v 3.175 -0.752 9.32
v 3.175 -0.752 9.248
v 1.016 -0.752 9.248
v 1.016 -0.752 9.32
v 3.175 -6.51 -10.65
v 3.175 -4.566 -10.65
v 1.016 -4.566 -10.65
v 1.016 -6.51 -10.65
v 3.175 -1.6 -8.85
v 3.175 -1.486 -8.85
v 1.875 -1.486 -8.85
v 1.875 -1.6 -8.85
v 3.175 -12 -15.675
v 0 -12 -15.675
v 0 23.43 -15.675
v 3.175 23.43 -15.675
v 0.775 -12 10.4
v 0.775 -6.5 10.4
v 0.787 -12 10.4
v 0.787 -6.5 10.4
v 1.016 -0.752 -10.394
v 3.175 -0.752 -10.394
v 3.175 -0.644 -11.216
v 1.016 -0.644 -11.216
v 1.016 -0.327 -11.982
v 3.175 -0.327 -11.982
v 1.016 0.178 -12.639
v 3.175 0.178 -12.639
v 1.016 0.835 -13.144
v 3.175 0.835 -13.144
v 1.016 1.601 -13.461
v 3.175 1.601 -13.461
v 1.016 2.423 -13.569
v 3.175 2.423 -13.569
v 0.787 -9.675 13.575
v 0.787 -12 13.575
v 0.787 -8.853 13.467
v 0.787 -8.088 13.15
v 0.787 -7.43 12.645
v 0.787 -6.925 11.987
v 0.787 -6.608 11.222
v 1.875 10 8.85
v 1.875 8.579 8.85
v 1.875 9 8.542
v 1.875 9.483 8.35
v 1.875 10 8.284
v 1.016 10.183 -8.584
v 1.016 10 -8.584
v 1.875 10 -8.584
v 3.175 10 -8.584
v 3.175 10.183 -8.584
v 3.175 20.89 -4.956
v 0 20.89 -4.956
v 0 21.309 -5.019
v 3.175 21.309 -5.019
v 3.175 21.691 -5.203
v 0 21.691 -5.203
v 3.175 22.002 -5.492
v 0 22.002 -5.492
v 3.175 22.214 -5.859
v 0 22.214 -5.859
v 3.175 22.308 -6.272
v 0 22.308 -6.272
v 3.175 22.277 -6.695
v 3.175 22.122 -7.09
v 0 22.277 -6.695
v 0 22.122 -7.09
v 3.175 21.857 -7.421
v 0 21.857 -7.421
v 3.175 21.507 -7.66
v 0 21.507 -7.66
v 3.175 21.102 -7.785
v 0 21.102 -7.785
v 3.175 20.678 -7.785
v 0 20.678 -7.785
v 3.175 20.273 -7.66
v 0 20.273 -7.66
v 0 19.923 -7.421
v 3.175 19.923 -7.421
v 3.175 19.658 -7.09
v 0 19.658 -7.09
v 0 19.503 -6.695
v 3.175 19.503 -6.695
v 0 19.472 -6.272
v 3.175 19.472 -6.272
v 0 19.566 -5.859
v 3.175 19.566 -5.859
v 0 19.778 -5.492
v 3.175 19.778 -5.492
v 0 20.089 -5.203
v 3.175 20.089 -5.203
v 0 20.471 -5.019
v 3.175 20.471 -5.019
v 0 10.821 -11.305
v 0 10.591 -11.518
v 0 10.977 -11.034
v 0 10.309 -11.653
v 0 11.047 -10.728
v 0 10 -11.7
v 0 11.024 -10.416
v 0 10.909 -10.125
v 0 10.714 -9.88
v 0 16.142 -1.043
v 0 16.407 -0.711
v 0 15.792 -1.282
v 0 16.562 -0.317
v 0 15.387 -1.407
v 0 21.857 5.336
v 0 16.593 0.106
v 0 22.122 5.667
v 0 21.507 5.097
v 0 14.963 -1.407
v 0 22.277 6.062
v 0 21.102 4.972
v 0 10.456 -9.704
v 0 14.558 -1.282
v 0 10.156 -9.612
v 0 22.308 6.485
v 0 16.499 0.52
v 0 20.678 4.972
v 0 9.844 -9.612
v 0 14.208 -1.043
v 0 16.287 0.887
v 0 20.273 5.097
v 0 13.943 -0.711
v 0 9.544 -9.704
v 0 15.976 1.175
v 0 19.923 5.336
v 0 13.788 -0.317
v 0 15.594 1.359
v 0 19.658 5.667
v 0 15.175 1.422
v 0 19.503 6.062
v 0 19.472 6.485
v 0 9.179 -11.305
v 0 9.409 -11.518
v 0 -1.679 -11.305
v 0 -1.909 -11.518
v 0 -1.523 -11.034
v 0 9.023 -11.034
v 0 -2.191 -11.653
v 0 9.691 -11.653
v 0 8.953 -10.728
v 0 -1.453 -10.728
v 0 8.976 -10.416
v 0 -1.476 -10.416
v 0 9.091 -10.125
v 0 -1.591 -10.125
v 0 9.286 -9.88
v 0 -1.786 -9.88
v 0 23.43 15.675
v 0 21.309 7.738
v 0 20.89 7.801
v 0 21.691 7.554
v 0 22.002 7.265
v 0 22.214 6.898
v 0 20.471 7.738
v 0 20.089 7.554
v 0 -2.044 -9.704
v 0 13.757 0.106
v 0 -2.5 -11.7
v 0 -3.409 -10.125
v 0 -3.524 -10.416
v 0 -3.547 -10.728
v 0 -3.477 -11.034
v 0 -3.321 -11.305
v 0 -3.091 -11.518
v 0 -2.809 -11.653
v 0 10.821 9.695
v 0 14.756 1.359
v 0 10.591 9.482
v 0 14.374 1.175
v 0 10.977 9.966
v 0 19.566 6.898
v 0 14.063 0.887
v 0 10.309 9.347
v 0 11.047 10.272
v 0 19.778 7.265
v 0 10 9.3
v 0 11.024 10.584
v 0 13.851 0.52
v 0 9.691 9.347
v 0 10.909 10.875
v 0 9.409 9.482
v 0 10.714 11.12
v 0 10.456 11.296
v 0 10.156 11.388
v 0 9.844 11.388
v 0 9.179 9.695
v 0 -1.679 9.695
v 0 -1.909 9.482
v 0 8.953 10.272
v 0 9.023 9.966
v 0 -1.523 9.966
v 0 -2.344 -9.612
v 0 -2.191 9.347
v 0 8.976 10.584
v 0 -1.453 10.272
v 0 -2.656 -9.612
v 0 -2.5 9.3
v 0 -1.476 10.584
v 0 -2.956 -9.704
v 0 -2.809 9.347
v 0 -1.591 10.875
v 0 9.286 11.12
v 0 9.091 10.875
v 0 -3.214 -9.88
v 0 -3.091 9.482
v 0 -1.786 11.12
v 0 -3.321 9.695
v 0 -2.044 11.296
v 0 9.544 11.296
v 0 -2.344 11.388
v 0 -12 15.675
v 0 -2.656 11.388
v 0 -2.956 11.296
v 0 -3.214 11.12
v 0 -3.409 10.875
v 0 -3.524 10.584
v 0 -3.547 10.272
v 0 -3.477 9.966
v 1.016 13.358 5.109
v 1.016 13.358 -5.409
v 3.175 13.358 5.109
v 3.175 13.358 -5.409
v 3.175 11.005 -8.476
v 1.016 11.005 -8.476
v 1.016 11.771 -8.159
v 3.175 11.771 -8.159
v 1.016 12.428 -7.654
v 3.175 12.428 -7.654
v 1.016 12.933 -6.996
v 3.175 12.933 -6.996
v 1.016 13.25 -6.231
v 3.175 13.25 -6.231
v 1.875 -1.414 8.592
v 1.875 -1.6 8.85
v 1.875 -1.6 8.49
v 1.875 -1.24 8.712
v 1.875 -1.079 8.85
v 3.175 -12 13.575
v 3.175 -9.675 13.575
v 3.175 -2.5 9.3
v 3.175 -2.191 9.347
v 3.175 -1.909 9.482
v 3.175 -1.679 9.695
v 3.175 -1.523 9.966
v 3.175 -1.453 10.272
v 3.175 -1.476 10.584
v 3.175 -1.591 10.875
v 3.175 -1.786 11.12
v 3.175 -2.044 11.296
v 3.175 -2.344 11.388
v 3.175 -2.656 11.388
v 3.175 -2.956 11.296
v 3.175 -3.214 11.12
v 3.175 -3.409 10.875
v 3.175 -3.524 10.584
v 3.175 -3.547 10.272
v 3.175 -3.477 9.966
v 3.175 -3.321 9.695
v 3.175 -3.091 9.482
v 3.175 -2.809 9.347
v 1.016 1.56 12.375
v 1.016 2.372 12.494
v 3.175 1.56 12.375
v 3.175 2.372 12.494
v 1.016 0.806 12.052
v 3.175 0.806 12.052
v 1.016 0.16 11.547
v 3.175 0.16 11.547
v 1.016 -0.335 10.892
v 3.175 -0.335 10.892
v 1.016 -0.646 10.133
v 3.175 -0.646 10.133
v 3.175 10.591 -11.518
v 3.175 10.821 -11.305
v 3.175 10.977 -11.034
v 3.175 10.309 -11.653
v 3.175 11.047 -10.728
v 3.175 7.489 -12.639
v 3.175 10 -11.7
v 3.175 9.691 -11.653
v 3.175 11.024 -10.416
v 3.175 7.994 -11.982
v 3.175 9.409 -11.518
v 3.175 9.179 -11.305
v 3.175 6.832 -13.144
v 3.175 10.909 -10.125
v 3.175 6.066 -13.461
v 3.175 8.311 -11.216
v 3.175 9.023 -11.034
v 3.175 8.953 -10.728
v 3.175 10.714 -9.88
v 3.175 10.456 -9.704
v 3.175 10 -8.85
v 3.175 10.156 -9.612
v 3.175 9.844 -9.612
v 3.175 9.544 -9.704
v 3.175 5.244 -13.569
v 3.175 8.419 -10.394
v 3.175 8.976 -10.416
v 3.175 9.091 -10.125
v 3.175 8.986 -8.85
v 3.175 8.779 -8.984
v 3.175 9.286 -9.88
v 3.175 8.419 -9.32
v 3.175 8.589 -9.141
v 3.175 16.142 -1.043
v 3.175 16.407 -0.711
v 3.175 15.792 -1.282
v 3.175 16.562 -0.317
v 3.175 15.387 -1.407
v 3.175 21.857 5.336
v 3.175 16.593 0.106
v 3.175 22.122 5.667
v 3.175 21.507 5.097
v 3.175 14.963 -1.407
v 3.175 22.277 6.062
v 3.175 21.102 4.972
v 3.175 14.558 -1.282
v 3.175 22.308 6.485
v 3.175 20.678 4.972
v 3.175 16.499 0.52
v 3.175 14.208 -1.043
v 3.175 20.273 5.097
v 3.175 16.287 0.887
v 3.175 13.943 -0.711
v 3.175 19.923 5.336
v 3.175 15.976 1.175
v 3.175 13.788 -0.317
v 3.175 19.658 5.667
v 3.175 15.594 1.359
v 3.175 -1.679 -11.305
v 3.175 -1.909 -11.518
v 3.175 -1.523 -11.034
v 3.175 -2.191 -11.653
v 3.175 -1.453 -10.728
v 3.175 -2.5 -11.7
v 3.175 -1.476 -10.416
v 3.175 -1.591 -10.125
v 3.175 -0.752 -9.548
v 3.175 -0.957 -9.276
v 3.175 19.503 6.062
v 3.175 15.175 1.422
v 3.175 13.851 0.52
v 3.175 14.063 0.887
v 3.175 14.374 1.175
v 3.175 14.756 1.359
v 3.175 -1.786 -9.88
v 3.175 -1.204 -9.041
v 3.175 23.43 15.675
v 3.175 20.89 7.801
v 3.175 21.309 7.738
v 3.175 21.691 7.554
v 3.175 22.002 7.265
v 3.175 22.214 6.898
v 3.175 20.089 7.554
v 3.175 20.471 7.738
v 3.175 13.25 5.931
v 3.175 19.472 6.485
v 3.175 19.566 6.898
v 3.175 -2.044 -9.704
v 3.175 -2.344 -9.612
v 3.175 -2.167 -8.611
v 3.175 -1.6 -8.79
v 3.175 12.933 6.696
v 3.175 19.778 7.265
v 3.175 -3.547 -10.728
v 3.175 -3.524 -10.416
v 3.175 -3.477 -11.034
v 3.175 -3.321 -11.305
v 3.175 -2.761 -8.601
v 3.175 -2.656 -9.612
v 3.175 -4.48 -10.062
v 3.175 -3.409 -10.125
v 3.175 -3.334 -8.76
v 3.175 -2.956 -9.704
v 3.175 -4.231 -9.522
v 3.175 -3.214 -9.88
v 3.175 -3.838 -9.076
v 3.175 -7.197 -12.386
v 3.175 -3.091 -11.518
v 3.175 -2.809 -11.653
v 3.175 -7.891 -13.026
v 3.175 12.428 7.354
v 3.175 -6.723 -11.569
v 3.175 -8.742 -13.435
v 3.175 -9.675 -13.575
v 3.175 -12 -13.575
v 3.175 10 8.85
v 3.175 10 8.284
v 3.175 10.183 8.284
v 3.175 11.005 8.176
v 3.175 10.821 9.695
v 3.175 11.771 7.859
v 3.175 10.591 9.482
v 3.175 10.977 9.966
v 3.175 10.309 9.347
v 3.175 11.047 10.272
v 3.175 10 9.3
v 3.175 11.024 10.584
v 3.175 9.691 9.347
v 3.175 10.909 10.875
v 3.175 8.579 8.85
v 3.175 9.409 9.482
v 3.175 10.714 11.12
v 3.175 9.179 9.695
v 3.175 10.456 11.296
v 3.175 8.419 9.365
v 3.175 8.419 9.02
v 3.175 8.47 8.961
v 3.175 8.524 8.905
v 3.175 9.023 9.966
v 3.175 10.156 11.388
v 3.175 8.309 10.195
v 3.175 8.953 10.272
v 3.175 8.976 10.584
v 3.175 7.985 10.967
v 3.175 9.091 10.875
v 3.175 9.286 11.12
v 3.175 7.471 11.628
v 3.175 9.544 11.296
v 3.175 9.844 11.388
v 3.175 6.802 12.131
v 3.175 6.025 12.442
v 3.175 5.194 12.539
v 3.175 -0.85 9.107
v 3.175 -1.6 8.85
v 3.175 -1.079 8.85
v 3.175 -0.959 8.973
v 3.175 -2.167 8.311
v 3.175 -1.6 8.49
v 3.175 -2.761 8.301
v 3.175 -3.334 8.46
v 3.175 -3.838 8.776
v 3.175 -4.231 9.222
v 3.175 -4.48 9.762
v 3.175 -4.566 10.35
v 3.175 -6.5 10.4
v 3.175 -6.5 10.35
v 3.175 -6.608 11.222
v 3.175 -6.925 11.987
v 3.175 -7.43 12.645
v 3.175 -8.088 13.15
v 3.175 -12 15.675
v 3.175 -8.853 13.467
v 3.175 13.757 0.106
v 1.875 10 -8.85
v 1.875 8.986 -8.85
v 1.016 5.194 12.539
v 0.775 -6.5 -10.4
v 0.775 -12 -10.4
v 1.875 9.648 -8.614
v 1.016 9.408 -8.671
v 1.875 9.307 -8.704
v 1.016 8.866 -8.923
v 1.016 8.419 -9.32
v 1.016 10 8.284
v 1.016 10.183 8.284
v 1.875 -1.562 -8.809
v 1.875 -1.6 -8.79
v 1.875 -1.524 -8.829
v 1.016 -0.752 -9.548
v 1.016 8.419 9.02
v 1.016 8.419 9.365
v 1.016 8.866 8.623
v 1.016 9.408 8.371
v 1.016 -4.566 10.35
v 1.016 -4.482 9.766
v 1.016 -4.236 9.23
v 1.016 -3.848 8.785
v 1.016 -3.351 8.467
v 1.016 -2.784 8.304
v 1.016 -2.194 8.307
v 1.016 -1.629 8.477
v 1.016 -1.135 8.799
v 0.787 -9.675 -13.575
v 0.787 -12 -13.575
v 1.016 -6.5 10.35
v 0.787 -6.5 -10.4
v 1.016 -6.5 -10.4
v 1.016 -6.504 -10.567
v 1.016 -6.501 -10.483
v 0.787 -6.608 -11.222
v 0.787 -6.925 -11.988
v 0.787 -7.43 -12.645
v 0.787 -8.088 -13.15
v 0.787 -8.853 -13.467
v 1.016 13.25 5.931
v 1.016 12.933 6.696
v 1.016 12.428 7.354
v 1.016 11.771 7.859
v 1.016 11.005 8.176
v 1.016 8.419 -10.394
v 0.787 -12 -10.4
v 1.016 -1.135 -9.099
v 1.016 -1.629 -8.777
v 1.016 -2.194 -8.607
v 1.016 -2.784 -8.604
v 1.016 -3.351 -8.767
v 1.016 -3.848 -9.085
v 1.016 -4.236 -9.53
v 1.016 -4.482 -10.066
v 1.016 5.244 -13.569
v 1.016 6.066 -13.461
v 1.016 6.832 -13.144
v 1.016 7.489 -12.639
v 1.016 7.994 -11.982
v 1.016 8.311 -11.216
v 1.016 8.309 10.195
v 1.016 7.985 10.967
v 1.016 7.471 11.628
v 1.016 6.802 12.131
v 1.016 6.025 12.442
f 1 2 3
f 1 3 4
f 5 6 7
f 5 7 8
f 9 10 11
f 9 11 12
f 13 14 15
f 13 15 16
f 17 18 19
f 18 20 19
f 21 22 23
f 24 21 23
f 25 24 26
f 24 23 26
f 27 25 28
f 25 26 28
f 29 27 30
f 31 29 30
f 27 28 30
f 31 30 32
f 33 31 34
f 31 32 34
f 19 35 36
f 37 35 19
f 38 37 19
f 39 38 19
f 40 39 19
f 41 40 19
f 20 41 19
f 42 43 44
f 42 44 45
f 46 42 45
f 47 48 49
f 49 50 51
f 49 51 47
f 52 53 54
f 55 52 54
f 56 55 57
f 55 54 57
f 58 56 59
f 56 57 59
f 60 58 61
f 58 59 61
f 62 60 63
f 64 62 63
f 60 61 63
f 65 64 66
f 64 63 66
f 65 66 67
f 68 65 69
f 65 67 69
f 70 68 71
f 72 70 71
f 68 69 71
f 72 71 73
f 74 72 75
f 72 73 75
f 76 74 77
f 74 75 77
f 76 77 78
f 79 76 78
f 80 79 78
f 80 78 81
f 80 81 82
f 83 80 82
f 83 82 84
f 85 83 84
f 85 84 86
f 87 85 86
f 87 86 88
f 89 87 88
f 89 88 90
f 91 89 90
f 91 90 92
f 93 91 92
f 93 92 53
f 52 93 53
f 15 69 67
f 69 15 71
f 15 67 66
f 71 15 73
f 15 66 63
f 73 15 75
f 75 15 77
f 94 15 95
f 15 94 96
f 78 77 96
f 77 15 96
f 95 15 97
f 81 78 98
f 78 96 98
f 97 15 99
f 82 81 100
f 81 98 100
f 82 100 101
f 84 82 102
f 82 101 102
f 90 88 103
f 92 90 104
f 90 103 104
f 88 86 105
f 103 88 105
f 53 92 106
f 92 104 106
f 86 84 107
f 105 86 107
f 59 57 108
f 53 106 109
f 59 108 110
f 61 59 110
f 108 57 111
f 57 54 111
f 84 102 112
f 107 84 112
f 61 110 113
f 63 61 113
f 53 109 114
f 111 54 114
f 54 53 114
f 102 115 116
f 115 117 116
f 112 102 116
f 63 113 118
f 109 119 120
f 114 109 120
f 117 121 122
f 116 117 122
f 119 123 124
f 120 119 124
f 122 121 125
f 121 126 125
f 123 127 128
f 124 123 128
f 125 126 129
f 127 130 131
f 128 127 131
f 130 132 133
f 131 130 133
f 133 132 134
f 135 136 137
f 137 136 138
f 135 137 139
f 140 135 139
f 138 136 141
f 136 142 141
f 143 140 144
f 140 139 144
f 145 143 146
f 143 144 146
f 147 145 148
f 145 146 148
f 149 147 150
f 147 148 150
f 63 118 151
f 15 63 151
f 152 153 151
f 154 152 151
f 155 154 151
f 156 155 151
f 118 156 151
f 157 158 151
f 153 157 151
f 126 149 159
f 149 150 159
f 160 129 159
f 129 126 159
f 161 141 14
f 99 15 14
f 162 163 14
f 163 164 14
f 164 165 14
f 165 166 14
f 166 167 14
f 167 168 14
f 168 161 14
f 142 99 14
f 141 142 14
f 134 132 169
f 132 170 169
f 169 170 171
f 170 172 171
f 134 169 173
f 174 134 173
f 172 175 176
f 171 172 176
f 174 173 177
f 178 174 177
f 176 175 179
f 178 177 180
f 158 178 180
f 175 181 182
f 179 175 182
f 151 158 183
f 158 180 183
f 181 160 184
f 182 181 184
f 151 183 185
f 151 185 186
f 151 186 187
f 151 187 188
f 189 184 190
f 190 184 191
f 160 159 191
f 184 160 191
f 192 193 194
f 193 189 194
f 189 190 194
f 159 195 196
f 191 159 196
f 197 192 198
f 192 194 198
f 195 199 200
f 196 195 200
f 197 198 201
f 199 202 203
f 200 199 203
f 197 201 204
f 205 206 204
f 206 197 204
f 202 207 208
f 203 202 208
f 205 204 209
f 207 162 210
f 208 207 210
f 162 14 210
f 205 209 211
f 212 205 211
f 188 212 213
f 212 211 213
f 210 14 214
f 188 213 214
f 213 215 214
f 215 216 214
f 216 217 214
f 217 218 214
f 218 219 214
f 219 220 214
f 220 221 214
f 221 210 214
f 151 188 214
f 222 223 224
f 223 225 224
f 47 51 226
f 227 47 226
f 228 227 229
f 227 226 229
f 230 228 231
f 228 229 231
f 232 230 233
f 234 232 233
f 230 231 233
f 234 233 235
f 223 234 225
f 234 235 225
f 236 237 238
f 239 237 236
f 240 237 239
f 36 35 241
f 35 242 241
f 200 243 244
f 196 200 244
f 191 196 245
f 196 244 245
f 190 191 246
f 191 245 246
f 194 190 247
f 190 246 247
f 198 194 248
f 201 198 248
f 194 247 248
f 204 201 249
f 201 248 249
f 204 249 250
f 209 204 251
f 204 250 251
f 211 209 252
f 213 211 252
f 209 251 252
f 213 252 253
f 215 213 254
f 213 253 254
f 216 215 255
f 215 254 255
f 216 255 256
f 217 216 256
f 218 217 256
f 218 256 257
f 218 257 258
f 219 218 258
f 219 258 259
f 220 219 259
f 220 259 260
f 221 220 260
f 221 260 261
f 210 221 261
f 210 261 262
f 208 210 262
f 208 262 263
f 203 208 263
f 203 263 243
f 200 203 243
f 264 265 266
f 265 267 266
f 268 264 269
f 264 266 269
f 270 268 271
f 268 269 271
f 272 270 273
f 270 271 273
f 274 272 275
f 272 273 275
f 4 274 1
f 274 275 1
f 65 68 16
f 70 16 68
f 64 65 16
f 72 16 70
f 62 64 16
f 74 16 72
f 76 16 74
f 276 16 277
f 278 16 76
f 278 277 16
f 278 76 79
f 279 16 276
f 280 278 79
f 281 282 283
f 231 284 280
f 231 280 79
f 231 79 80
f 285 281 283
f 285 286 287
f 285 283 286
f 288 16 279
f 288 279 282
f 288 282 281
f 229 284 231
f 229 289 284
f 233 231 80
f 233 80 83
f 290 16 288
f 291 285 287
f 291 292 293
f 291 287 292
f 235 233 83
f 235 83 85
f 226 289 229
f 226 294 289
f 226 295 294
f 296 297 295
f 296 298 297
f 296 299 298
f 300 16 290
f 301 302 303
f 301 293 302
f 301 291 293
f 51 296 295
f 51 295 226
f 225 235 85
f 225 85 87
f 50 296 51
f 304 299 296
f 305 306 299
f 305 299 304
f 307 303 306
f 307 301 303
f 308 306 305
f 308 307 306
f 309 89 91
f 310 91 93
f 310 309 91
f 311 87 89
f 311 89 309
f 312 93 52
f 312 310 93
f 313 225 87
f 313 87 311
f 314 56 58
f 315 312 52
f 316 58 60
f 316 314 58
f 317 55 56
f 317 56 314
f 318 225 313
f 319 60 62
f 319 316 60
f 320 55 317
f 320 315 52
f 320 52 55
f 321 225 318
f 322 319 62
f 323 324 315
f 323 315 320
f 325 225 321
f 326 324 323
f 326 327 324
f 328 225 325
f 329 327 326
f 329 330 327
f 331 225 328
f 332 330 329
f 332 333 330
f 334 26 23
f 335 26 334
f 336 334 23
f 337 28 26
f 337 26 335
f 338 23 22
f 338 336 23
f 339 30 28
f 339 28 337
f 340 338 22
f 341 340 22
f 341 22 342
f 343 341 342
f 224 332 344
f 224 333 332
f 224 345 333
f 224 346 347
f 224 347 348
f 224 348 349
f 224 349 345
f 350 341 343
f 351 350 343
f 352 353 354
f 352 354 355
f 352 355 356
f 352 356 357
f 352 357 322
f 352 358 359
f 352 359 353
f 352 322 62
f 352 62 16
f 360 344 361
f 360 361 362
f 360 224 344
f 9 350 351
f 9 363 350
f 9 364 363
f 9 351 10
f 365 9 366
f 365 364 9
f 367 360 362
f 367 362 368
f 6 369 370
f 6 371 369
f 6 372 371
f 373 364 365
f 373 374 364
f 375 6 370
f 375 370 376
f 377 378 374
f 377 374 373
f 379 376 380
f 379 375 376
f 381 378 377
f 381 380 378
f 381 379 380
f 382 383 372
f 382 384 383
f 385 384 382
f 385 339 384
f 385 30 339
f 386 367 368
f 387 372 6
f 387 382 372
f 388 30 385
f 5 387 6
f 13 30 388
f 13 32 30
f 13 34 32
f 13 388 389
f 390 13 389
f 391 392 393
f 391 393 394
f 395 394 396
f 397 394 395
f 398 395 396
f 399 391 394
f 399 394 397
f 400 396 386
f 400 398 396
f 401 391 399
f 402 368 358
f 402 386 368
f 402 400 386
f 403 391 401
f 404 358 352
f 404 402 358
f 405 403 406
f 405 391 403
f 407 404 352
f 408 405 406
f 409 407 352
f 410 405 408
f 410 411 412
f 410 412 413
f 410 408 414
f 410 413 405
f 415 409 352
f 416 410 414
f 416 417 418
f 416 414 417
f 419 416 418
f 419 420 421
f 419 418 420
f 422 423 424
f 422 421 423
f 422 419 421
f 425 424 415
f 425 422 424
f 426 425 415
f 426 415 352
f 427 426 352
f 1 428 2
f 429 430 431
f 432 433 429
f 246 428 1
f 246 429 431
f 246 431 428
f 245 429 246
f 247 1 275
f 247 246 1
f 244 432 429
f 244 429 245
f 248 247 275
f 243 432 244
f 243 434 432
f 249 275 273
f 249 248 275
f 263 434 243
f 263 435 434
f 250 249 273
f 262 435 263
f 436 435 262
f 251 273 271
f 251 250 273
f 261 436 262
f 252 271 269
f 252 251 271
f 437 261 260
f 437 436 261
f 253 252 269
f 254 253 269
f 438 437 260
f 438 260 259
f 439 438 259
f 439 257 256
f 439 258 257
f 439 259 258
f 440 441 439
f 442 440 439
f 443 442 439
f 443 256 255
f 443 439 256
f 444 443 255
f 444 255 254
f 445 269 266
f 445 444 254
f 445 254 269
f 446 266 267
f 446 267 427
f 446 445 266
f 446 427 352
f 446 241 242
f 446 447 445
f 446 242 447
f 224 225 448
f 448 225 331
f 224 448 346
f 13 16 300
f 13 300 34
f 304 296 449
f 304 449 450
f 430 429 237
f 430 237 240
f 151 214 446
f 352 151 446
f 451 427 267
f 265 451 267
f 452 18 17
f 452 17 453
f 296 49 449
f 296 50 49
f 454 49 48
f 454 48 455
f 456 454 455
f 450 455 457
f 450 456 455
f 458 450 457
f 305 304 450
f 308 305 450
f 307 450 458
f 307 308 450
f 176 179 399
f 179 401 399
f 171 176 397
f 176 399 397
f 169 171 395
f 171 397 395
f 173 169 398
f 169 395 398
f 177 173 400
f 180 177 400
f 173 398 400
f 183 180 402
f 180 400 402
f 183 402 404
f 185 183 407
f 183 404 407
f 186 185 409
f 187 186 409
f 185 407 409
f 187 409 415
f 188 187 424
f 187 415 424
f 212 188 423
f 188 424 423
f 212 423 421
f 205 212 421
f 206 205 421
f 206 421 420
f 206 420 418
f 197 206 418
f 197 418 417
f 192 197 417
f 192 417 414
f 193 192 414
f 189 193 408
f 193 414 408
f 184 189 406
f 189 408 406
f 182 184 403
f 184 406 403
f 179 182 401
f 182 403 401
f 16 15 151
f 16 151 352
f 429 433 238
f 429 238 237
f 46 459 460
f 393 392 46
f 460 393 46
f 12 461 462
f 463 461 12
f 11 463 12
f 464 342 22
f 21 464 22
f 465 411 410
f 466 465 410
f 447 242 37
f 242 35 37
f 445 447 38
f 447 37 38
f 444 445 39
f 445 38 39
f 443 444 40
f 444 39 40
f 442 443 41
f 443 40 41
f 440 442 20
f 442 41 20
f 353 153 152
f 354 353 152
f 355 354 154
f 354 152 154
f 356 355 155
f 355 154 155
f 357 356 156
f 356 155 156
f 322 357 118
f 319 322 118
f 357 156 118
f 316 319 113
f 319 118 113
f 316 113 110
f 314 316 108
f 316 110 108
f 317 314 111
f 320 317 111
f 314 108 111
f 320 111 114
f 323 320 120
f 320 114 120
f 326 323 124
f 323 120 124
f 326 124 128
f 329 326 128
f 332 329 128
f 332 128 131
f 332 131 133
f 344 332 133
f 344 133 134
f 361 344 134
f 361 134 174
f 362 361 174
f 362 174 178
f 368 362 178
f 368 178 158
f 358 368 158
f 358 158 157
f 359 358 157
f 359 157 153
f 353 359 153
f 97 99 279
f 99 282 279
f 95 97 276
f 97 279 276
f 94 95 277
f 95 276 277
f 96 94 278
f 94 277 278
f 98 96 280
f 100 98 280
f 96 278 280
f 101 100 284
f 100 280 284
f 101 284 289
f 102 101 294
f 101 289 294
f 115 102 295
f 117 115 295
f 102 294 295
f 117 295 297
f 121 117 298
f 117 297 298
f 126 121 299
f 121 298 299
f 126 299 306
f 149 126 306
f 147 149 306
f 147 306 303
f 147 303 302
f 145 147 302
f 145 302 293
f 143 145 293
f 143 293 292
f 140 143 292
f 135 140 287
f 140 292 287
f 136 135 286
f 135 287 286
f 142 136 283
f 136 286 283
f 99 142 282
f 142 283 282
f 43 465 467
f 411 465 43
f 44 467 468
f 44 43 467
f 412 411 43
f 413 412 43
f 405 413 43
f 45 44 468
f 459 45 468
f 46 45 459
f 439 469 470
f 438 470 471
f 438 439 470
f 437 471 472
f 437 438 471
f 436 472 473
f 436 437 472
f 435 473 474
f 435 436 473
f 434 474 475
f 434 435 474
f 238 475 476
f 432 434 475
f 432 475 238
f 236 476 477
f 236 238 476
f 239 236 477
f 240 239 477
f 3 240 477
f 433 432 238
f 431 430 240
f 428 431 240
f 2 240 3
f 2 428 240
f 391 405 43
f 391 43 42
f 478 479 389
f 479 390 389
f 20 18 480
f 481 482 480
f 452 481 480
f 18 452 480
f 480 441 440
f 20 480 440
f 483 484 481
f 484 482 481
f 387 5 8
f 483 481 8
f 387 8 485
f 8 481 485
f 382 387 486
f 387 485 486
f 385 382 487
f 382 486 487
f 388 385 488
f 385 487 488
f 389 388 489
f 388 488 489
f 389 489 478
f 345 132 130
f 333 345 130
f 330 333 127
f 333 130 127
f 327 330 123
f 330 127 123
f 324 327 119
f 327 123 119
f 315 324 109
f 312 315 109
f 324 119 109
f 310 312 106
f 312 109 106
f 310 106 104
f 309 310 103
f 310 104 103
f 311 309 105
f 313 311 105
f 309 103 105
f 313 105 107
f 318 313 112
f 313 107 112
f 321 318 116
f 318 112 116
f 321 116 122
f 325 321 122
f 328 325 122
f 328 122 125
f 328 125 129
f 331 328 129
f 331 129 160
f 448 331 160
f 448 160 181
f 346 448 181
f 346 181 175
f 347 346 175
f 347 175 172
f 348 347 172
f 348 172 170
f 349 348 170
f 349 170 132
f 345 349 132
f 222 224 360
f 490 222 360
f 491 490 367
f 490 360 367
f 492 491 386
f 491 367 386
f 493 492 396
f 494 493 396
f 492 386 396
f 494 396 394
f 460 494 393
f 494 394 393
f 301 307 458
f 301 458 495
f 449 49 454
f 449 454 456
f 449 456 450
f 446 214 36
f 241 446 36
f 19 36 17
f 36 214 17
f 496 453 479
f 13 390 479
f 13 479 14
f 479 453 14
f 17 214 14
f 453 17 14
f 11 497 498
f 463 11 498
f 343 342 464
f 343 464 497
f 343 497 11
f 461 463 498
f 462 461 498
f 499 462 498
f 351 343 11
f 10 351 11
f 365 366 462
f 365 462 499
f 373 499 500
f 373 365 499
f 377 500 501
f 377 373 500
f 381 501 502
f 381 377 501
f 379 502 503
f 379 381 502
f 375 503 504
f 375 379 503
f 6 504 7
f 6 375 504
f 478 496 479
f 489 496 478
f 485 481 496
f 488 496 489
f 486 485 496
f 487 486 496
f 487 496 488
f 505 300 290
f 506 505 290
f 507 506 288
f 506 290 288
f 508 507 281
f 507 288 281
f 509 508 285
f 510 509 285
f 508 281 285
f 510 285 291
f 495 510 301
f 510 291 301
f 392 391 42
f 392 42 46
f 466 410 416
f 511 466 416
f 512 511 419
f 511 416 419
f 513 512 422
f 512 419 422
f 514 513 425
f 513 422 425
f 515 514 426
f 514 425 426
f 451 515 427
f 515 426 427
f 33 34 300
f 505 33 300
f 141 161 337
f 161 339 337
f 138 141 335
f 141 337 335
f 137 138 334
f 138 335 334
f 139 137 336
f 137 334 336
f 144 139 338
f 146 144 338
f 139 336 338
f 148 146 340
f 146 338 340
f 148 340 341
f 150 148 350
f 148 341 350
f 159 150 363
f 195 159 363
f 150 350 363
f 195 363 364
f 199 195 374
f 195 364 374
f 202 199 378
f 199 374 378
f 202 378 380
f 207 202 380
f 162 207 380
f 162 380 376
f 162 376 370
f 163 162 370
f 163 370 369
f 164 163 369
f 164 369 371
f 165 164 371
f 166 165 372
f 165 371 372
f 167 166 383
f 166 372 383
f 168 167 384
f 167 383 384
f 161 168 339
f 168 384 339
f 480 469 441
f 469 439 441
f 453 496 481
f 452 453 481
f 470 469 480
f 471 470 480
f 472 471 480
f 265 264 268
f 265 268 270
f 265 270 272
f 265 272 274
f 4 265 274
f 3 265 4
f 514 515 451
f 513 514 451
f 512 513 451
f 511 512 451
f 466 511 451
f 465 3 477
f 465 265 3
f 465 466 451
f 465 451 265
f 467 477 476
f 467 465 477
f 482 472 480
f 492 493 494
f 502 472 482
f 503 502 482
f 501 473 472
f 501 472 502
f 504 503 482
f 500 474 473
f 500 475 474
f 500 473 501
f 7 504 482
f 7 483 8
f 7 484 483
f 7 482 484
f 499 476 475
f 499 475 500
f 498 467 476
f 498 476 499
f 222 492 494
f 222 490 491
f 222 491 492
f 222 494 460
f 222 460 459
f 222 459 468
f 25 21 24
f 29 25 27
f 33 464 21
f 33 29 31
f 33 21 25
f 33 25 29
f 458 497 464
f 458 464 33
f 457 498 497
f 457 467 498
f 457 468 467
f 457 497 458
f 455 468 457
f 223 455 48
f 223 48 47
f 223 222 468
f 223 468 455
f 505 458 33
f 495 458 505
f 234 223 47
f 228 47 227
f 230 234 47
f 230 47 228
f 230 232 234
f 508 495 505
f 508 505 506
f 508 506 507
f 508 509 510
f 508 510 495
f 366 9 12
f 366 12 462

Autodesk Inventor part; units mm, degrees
ref_plane "YZ Plane" through (0, 0, 0) normal (1, 0, 0) x (0, 1, 0)
ref_plane "XZ Plane" through (0, 0, 0) normal (0, 1, 0) x (-1, 0, 0)
ref_plane "XY Plane" through (0, 0, 0) normal (0, 0, 1) x (1, 0, 0)
sketch "Sketch2" plane through (0, 0, 0) normal (1, 0, 0) x (0, 1, 0)
  line L0 (12, 15.675) -> (-12, 15.675)
  line L1 (-12, 15.675) -> (-12, -15.675)
  line L2 (-12, -15.675) -> (12, -15.675)
  line L3 (12, -15.675) -> (12, 15.675)
  point P0 (0, 0)
  dimension "d4" = 24
  dimension "d5" = 31.35
  dimension "d6" = 15.675
  dimension "d7" = 12
extrude "Extrusion1" add sketch "Sketch2" along normal blind 3.175
sketch "Sketch3" plane through (3.175, 0, 0) normal (1, 0, 0) x (0, 0, -1)
  line L0 (-15.675, -12) -> (15.675, -12)
  line L1 (-10.4, -12) -> (10.4, -12)
  line L2 (10.4, -12) -> (10.4, -6.5)
  line L3 (10.4, -6.5) -> (-10.4, -6.5)
  line L4 (-10.4, -6.5) -> (-10.4, -12)
  point P0 (0, 0)
  dimension "d16" = 20.8
  dimension "d17" = 10.4
  dimension "d18" = 5.5
extrude "Extrusion2" cut sketch "Sketch3" against normal blind 2.4
sketch "Sketch4" plane through (3.175, 0, 0) normal (1, 0, 0) x (0, 0, -1)
  line L0 (-8.85, 10) -> (8.85, 10)
  line L1 (8.85, 10) -> (8.85, -1.6)
  line L2 (8.85, -1.6) -> (-8.85, -1.6)
  line L3 (-8.85, -1.6) -> (-8.85, 10)
  line L4 (-10.4, -6.5) -> (10.4, -6.5)
  line L5 (10.4, -12) -> (-10.4, -12)
  point P0 (0, 4.2)
  dimension "d21" = 17.7
  dimension "d22" = 8.85
  dimension "d23" = 5.8
  dimension "d24" = 11.6
  dimension "d27" = 10.4
extrude "Extrusion3" cut sketch "Sketch4" against normal blind 1.3
sketch "Sketch5" plane through (3.175, 0, 0) normal (1, 0, 0) x (0, 0, -1)
  circle A0 centre (-10.65, 10.9) radius 0.8411
  circle A1 centre (10.65, 10.9) radius 0.8411
  line L0 (-15.675, 12) -> (-15.675, -12)
  line L1 (15.675, 12) -> (-15.675, 12)
  line L2 (15.675, -12) -> (15.675, 12)
  line L3 (8.85, 10) -> (8.85, -1.6)
  line L4 (-8.85, 10) -> (8.85, 10)
  point P0 (0, 0)
  dimension "d31" = 1.6822
  dimension "d33" = 1.6822
  dimension "d60" = 1.8
  dimension "d62" = 0.9
  dimension "d67" = 0.9
  dimension "d68" = 1.8
extrude "Extrusion7" [suppressed]
sketch "Sketch12" plane through (0, 12, 15.675) normal (0, 1, 0) x (1, 0, 0)
  line L0 (0, 31.35) -> (0, 0)
  line L1 (0, 0) -> (3.175, 0)
  line L2 (3.175, 31.35) -> (3.175, 0)
  line L3 (0, 31.35) -> (3.175, 31.35)
  point P0 (0, 15.675)
extrude "Extrusion14" add sketch "Sketch12" along normal blind 11.43
sketch "Sketch13" plane through (0, 0, 0) normal (-1, 0, 0) x (0, 0, 1)
  circle A0 centre (-6.3786, 20.89) radius 1.4224
  circle A1 centre (6.3786, 20.89) radius 1.4224
  line L0 (-15.675, 23.43) -> (15.675, 23.43)
  line L1 (-15.675, -12) -> (-15.675, 23.43)
  line L2 (15.675, 23.43) -> (15.675, -12)
  circle A2 centre (0, 15.175) radius 1.4224
  point P0 (0, 0)
  dimension "d92" = 2.8448
  dimension "d93" = 2.8448
  dimension "d94" = 2.54
  dimension "d95" = 9.2964
  dimension "d96" = 9.2964
  dimension "d97" = 2.54
  dimension "d98" = 2.8448
  dimension "d99" = 8.255
  dimension "d100" = 31.35
  dimension "d101" = 15.675
extrude "Extrusion15" cut sketch "Sketch13" against normal through all
sketch "Sketch14" plane through (3.175, 0, 0) normal (1, 0, 0) x (0, 0, -1)
  circle A0 centre (12.65, -2.5) radius 1.05
  line L0 (10.4, -12) -> (15.675, -12)
  line L1 (15.675, -12) -> (15.675, -0.0588)
  circle A1 centre (12.65, 10) radius 1.05
  line L2 (15.675, -12) -> (15.675, 23.43)
  line L3 (10.4, -6.5) -> (10.4, -12)
  line L4 (-15.675, 23.43) -> (15.675, 23.43)
  line L5 (0, 23.43) -> (0, -12) construction
  line L6 (-15.675, -12) -> (15.675, -12)
  circle A2 centre (-12.65, -2.5) radius 1.05
  circle A3 centre (-12.65, 10) radius 1.05
  point P0 (0, 0)
  point P1 (15.675, 6.4088)
  dimension "d105" = 9.5
  dimension "d108" = 12.5
  dimension "d111" = 2.25
  dimension "d112" = 2.25
extrude "Extrusion16" [suppressed]
sketch "Sketch15" plane through (0, 0, 0) normal (-1, 0, 0) x (0, 0, 1)
  circle A0 centre (-11.0465, 10) radius 1.05
  line L0 (-15.675, -12) -> (-15.675, 23.43)
  line L1 (-15.675, 23.43) -> (15.675, 23.43)
  line L2 (0, -12) -> (0, 23.43) construction
  line L3 (15.675, 23.43) -> (-15.675, 23.43)
  circle A1 centre (11.0465, 10) radius 1.05
  circle A2 centre (-10.5016, -2.4993) radius 1.05
  circle A3 centre (10.5016, -2.4993) radius 1.05
  point P0 (0, 0)
  dimension "d115" = 2.1
  dimension "d117" = 13.43
  dimension "d125" = 11.0465
  dimension "d128" = 2.1
  dimension "d129" = 2.1
  dimension "d130" = 2.1
  dimension "d131" = 22.0929
  dimension "d132" = 21.0033
  dimension "d133" = 12.4993
  dimension "d134" = 10.5016
  dimension "d135" = 12.4993
extrude "Extrusion17" [suppressed]
sketch "Sketch16" plane through (3.175, 0, 0) normal (1, 0, 0) x (0, 0, -1)
  circle A0 centre (-10.35, 10) radius 1.05
  circle A1 centre (10.65, 10) radius 1.05
  circle A2 centre (10.65, -2.5) radius 1.05
  circle A3 centre (-10.35, -2.5) radius 1.05
  point P0 (0, 0)
extrude "Extrusion18" cut sketch "Sketch16" against normal through all
sketch "Sketch17" plane through (3.175, 0, 0) normal (1, 0, 0) x (0, 0, -1)
  line L0 (-15.675, -12) -> (15.675, -12)
  line L1 (-13.575, -12) -> (13.575, -12)
  line L2 (13.575, -12) -> (13.575, -6.5)
  line L3 (13.575, -6.5) -> (-13.575, -6.5)
  line L4 (-13.575, -6.5) -> (-13.575, -12)
  line L5 (-10.4, -6.5) -> (10.4, -6.5)
  line L6 (10.4, -6.5) -> (10.4, -12)
  line L7 (-10.4, -12) -> (-10.4, -6.5)
  point P0 (0, 0)
  dimension "d138" = 0
  dimension "d139" = 3.175
  dimension "d140" = 3.175
extrude "Extrusion19" cut sketch "Sketch17" against normal blind 2.3876 contours L4 L3 L7 L0 | L6 L3 L2 L0
sketch "Sketch18" plane through (3.175, 0, 0) normal (1, 0, 0) x (0, 0, -1)
  circle A0 centre (-10.35, 10) radius 1.05
  circle A1 centre (10.65, 10) radius 1.05
  circle A2 centre (10.65, -2.5) radius 1.05
  circle A3 centre (-10.35, -2.5) radius 1.05
  arc A4 (-9.0198, 8.4192) -> (-8.284, 10) centre (-10.35, 10) ccw
  arc A5 (8.584, 10) -> (9.3198, 8.4192) centre (10.65, 10) ccw
  arc A6 (9.5482, -0.7523) -> (10.65, -4.566) centre (10.65, -2.5) ccw
  arc A7 (-10.35, -4.566) -> (-9.2482, -0.7523) centre (-10.35, -2.5) ccw
  line L0 (-12.5392, 5.1935) -> (-12.4941, 2.372)
  line L1 (13.569, 2.4227) -> (13.569, 5.2442)
  line L2 (5.409, 13.3584) -> (-5.109, 13.3584)
  line L3 (-10.35, -4.566) -> (-10.35, -6.5)
  line L4 (-10.35, -6.5) -> (10.65, -6.5)
  line L5 (-13.575, -6.5) -> (13.575, -6.5)
  line L6 (10.65, -4.566) -> (10.65, -6.5)
  line L7 (9.5482, -0.7523) -> (10.394, -0.7523)
  line L8 (9.3198, 8.4192) -> (10.394, 8.4192)
  line L9 (8.584, 10) -> (8.584, 10.1834)
  line L10 (-8.284, 10) -> (-8.284, 10.1834)
  line L11 (-9.0198, 8.4192) -> (-9.3646, 8.4192)
  line L12 (-9.2482, -0.7523) -> (-9.3195, -0.7523)
  arc A8 (13.569, 5.2442) -> (10.394, 8.4192) centre (10.394, 5.2442) ccw
  arc A9 (8.584, 10.1834) -> (5.409, 13.3584) centre (5.409, 10.1834) ccw
  arc A10 (-5.109, 13.3584) -> (-8.284, 10.1834) centre (-5.109, 10.1834) ccw
  arc A11 (-9.3646, 8.4192) -> (-12.5392, 5.1935) centre (-9.3646, 5.2442) ccw
  arc A12 (-12.4941, 2.372) -> (-9.3195, -0.7523) centre (-9.3195, 2.4227) ccw
  arc A13 (10.394, -0.7523) -> (13.569, 2.4227) centre (10.394, 2.4227) ccw
  point P0 (0, 0)
  point P1 (-12.4442, -0.7523)
  point P2 (-12.5907, 8.4192)
  dimension "d143" = 1.016
  dimension "d144" = 1.016
  dimension "d145" = 1.016
  dimension "d146" = 1.016
  dimension "d147" = 3.175
extrude "Extrusion20" cut sketch "Sketch18" against normal blind 2.159 contours A4 L10 A10 L2 A9 L9 A5 L8 A8 L1 A13 L7 A6 L6 L4 L3 A7 L12 A12 L0 A11 L11
sketch "Sketch19" plane through (3.175, 0, 0) normal (1, 0, 0) x (0, 0, -1)
  line L0 (-13.575, -12) -> (-13.575, -6.5)
  line L1 (-13.575, -12) -> (13.7056, -12)
  line L2 (13.7056, -12) -> (13.7056, -9.675)
  line L3 (10.5306, -6.5) -> (-10.4, -6.5)
  line L4 (-13.575, -9.675) -> (-13.575, -12)
  arc A0 (-10.4, -6.5) -> (-13.575, -9.675) centre (-10.4, -9.675) ccw
  arc A1 (13.7056, -9.675) -> (10.5306, -6.5) centre (10.5306, -9.675) ccw
  point P0 (0, 0)
  dimension "d150" = 3.175
fillet "Fillet1" radius 3.175 2 edges at (1.9812, -6.5, -13.575) (1.9812, -6.5, 13.575)
equation "\"d6\" = 0.5 * d5"
equation "\"d7\" = 0.5 * d4"
equation "\"d17\" = 0.5 * d16"
equation "\"d22\" = 0.5 * d21"
equation "\"d23\" = 0.5 * d24"
equation "\"d31\" = d30"
equation "\"d33\" = d30"
equation "\"d67\" = d62"
equation "\"d68\" = d60"
equation "\"d93\" = d92"
equation "\"d96\" = d95"
equation "\"d98\" = d92"
equation "\"d101\" = 0.5 * d100"
equation "\"d112\" = d111"
equation "\"d125\" = 0.5 * d131"
equation "\"d128\" = d115"
equation "\"d129\" = d115"
equation "\"d130\" = d115"
equation "\"d134\" = 0.5 * d132"
equation "\"d135\" = d133"
equation "\"d30\" = 1.682224"
properties part number "Pi cCam Mount" material "Aluminum 6061-AHC"
